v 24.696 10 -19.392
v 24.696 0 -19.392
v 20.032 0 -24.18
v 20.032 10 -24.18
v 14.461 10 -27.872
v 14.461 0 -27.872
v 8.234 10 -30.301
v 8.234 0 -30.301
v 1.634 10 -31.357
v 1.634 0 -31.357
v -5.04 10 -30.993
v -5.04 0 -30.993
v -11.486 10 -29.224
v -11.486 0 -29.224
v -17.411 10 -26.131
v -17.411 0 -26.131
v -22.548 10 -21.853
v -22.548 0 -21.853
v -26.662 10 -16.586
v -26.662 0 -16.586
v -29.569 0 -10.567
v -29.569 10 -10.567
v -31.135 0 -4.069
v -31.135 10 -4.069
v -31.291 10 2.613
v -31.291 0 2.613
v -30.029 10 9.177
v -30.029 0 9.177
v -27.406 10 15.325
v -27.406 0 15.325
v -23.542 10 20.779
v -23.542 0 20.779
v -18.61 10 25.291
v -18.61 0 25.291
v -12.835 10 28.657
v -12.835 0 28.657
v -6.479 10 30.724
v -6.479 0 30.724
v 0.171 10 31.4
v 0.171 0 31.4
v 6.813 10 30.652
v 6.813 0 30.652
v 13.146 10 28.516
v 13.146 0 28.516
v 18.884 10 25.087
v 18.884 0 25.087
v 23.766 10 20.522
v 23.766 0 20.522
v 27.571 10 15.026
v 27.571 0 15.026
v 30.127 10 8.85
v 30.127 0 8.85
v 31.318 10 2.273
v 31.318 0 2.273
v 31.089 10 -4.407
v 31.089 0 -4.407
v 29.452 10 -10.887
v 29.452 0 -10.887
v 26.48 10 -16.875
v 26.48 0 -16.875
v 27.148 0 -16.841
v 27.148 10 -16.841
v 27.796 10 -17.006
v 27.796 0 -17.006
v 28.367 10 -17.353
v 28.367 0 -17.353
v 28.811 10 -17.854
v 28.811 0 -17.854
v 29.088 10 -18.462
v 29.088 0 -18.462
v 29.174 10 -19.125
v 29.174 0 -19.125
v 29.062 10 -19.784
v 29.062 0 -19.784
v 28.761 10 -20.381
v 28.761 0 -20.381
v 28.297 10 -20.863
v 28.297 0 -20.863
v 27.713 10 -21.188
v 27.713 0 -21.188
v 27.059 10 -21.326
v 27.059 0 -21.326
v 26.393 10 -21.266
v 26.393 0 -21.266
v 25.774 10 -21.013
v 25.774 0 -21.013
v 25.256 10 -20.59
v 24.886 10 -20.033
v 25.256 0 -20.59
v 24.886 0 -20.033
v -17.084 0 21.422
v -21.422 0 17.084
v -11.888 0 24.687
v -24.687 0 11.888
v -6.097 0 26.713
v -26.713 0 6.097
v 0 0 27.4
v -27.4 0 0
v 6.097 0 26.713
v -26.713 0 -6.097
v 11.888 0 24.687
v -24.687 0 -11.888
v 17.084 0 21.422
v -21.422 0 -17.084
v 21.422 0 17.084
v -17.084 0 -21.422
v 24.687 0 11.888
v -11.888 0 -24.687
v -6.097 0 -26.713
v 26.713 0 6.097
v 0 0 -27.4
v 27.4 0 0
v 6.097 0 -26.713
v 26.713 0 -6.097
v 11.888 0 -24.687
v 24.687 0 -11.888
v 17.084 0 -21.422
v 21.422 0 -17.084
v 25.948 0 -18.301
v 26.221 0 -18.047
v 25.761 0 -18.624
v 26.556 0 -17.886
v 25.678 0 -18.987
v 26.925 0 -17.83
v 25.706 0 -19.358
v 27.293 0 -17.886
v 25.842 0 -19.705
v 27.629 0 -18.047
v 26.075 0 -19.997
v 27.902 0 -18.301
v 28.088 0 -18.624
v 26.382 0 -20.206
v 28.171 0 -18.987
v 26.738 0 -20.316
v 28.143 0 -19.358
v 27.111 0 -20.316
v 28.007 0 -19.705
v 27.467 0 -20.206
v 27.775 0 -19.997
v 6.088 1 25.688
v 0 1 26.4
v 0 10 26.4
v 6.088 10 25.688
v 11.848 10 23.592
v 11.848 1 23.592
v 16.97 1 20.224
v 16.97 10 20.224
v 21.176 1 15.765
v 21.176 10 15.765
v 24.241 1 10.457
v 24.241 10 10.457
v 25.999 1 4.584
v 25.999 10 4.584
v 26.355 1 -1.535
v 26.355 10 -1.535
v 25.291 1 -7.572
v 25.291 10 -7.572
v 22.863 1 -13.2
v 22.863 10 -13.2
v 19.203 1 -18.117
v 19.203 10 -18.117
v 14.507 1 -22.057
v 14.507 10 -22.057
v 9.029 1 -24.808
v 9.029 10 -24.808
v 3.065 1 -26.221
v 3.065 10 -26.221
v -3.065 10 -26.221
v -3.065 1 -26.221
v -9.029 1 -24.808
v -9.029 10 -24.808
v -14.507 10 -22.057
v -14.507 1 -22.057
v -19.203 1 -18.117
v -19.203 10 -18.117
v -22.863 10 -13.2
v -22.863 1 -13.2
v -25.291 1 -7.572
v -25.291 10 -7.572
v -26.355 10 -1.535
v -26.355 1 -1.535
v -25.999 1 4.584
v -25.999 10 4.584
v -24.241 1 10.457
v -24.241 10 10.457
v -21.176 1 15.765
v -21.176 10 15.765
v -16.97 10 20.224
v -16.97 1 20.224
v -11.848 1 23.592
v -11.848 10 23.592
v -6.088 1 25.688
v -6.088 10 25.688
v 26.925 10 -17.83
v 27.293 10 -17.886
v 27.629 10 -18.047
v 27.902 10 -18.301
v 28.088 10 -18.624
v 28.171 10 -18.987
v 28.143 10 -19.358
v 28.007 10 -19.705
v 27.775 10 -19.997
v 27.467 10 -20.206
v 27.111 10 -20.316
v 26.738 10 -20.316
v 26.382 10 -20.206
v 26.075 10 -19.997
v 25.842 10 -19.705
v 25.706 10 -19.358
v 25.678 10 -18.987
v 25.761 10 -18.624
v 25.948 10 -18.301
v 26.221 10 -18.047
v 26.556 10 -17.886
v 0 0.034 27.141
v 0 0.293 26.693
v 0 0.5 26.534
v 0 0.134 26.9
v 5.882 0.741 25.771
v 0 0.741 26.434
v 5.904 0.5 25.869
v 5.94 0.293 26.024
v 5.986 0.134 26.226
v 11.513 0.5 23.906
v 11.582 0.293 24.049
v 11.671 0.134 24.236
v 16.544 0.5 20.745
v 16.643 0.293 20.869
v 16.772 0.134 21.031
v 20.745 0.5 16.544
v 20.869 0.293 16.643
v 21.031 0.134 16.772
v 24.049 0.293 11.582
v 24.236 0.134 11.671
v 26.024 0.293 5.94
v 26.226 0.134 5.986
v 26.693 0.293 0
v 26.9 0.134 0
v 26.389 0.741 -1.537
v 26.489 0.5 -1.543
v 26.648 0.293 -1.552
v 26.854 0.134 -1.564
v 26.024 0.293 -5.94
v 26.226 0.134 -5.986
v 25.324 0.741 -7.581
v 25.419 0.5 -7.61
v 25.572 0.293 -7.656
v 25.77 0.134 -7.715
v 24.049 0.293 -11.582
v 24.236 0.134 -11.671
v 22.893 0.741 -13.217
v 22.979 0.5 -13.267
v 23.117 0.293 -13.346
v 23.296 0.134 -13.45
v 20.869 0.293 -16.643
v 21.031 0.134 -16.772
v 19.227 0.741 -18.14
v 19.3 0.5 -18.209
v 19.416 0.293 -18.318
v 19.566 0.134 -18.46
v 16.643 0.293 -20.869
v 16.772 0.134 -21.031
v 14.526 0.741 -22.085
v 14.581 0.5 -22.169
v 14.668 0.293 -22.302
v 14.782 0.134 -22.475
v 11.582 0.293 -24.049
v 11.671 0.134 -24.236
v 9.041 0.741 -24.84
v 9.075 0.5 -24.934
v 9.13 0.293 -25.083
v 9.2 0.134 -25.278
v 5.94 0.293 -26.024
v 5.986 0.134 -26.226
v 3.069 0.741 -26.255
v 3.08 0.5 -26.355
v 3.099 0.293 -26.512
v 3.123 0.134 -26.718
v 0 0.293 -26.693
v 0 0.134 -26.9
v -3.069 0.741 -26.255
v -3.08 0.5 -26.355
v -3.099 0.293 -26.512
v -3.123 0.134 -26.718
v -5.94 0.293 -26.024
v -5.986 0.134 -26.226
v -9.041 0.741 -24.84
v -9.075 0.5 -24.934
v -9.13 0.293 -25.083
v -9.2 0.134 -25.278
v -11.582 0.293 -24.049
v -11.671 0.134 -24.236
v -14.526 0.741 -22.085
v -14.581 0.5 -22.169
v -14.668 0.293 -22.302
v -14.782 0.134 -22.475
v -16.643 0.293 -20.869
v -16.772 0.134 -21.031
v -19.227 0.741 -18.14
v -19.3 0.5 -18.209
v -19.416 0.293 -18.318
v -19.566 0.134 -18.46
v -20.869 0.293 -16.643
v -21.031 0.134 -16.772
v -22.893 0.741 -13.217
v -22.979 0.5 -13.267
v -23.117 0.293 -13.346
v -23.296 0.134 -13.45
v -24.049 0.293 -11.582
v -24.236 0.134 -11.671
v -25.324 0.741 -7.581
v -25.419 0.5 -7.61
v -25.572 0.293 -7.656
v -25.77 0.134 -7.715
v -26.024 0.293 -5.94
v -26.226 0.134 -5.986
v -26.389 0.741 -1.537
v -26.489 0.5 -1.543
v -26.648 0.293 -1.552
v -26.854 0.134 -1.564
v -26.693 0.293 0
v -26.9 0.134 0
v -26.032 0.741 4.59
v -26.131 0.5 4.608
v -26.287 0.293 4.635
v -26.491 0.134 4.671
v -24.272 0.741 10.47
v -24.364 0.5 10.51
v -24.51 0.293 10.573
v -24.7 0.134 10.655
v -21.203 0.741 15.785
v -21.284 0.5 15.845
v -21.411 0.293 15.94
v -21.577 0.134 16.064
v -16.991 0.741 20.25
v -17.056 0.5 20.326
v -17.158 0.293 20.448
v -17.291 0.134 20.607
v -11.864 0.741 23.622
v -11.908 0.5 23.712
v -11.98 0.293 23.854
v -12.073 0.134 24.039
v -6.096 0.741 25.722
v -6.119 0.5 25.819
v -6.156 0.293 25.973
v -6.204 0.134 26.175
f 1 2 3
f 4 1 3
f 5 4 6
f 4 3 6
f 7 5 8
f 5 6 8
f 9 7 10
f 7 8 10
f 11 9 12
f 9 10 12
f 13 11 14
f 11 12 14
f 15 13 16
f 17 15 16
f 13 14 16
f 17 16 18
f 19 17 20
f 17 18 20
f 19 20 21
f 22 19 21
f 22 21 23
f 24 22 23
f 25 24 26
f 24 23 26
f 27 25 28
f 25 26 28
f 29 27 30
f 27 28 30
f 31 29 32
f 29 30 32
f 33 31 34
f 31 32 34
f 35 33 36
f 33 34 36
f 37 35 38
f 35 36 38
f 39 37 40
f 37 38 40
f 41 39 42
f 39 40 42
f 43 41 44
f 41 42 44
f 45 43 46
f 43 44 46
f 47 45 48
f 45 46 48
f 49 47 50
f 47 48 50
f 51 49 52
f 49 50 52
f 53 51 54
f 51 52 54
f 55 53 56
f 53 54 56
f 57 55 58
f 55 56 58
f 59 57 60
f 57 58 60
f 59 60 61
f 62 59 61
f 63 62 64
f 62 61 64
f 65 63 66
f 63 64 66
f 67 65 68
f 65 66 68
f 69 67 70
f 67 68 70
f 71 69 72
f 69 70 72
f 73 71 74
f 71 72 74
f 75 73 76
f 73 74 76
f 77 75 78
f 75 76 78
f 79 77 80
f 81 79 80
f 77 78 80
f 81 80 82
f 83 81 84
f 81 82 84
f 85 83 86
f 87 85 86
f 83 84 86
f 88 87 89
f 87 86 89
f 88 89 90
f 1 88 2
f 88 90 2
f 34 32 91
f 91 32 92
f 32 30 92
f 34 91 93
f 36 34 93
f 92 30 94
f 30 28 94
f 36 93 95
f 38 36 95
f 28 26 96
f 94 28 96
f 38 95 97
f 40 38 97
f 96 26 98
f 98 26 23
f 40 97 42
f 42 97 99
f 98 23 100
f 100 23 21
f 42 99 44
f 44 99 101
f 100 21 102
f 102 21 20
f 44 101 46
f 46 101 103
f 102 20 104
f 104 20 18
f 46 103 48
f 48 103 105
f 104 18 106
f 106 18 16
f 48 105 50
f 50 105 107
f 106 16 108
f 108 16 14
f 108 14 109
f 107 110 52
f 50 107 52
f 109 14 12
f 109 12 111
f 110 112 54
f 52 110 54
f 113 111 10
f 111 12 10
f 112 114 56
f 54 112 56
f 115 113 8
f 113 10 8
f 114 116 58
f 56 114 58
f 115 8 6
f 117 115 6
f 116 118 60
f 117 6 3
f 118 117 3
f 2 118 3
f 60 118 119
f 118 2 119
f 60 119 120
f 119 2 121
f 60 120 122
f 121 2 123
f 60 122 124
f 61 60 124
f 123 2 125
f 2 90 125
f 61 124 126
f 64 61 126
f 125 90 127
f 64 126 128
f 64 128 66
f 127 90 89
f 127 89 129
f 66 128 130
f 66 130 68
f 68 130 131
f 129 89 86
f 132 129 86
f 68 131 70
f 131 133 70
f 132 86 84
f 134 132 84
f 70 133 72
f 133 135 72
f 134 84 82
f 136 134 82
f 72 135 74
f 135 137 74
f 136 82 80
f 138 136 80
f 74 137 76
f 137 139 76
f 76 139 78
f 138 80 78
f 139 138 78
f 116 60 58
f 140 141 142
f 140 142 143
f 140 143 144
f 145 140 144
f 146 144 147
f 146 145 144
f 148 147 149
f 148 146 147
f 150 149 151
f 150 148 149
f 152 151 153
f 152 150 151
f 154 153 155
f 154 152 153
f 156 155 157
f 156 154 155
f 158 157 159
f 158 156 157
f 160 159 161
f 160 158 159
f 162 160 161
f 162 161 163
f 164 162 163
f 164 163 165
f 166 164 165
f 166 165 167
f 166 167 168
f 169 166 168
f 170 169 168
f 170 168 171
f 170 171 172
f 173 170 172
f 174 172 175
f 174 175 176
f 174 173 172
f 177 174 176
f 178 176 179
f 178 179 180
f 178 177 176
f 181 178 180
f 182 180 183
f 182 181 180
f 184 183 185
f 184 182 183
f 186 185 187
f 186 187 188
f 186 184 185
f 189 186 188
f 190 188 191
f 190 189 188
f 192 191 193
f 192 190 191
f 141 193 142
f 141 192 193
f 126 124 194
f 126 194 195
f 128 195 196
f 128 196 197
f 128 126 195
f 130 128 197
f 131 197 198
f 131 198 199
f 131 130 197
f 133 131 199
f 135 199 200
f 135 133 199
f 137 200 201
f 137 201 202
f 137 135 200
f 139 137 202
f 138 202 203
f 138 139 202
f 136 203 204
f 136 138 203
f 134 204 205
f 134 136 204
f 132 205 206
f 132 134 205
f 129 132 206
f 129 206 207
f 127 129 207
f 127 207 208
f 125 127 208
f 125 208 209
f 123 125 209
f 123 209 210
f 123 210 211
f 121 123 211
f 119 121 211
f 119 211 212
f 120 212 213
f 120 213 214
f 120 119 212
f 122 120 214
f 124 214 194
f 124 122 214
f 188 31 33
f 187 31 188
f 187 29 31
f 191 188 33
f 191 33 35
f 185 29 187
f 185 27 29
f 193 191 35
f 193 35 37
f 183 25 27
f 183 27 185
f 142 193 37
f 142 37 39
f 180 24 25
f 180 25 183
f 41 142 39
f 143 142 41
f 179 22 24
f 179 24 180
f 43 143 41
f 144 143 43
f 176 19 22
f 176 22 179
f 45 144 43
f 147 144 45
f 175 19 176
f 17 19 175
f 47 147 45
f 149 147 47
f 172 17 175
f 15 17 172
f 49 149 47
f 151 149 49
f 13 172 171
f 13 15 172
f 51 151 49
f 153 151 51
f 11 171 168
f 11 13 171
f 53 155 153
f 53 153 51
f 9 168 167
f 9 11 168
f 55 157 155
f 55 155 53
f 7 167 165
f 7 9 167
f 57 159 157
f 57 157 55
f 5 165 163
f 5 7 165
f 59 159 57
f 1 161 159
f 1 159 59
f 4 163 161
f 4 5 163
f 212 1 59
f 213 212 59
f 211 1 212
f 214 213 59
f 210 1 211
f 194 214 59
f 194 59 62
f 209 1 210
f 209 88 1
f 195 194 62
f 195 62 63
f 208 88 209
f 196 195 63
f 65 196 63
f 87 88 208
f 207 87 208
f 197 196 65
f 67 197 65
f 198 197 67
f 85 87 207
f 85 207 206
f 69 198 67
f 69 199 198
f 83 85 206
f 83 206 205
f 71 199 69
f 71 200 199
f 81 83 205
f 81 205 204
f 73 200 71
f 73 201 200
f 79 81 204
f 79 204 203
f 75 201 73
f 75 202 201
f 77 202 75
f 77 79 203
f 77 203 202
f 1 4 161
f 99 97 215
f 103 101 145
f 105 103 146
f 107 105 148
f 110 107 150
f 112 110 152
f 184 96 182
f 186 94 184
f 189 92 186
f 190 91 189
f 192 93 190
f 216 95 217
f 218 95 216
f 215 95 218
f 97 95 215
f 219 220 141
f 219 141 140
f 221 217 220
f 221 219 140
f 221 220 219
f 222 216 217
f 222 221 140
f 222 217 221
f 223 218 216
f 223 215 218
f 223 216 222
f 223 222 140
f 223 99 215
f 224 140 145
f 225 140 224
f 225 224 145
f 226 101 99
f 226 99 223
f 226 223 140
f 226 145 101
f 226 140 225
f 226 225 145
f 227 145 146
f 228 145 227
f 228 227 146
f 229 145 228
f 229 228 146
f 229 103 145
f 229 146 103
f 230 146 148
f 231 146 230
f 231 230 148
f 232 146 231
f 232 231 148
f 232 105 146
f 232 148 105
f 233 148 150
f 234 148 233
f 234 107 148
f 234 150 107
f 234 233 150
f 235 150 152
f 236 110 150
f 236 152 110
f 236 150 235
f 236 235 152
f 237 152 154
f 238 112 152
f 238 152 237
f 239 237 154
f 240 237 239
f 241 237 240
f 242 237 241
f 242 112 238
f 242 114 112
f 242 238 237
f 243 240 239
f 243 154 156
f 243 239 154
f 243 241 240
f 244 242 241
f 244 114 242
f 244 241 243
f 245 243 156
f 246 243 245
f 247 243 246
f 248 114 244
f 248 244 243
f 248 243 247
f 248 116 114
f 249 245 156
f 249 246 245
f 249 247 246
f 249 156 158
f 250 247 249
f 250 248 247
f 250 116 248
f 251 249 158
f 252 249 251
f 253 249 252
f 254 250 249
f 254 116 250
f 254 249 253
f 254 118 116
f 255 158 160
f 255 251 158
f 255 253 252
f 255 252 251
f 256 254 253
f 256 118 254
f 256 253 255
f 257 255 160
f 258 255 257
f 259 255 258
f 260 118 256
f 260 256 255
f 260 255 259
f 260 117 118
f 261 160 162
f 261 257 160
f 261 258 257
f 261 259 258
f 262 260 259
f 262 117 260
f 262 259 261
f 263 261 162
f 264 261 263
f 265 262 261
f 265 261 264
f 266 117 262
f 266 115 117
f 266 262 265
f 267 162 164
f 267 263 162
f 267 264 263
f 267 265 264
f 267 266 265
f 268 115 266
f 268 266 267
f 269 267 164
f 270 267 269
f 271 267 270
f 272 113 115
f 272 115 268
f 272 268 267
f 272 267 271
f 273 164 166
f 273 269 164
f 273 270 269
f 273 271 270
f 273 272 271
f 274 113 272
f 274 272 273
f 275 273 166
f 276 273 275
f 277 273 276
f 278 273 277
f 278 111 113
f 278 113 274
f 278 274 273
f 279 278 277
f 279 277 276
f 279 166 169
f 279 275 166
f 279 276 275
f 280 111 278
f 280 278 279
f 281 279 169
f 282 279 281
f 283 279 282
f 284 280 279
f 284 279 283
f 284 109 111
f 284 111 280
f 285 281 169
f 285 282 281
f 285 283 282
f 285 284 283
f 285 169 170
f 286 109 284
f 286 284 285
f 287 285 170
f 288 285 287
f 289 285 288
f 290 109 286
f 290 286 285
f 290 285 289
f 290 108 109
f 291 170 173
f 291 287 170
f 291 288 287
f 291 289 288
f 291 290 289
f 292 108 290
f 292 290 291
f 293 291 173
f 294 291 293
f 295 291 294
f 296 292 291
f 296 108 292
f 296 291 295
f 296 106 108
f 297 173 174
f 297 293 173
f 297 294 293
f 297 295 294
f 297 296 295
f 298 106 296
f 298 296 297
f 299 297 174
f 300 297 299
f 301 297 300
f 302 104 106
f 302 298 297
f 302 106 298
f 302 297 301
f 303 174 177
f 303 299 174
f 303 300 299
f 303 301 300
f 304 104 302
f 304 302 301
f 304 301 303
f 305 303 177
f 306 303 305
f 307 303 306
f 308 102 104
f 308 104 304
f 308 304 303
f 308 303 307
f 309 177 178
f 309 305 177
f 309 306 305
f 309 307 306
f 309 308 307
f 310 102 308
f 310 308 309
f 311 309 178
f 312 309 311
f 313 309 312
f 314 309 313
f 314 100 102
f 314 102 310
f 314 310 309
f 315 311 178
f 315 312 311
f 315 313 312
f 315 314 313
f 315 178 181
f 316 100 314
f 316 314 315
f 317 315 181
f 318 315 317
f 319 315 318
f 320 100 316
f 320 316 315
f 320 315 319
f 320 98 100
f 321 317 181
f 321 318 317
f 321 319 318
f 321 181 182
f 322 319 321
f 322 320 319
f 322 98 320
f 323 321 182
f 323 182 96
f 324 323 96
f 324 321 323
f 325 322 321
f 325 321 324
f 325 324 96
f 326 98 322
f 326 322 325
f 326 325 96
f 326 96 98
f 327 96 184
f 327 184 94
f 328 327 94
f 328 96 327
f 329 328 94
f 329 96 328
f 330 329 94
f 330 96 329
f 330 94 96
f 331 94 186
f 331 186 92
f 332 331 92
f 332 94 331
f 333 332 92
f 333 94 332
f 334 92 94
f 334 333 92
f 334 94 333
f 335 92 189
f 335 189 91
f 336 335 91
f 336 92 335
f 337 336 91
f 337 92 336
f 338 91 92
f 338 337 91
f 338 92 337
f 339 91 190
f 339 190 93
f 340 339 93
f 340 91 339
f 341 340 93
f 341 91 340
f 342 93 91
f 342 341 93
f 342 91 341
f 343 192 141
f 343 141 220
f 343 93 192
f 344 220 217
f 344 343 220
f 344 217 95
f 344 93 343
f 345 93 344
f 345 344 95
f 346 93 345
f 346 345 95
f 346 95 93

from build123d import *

# Parameters (mm, degrees)
SKETCH_1_R      = 26.4
SKETCH_1_R_2    = 1.25
EXTRUDE_1_DEPTH = 10
FILLET_1_R      = 1


with BuildPart() as part:
    # 草图1 → 凸台-拉伸1 (new body)
    with BuildSketch(Plane(origin=(0, 0, 0), x_dir=(1, 0, 0), z_dir=(0, 1, 0))):
        with BuildLine():
            ThreePointArc((24.696486218, 19.391842834), (-25.619357757, -18.155123468), (26.480356643, 16.87455813))
            ThreePointArc((26.480356643, 16.87455813), (28.760584743, 20.381149753), (24.696486218, 19.391842834))
        make_face()
        with Locations(Location((0, 0, 0), (0, 0, 270))):
            Circle(SKETCH_1_R, mode=Mode.SUBTRACT)
        with Locations(Location((26.924802738, 19.080225301, 0), (0, 0, 270))):
            Circle(SKETCH_1_R_2, mode=Mode.SUBTRACT)
    extrude(amount=EXTRUDE_1_DEPTH)

    # 圆角1
    fillet_1_edges = [part.edges().sort_by_distance(p)[0] for p in [
        (0, 0, -26.4),
    ]]
    fillet(fillet_1_edges, radius=FILLET_1_R)


solid = part.part
